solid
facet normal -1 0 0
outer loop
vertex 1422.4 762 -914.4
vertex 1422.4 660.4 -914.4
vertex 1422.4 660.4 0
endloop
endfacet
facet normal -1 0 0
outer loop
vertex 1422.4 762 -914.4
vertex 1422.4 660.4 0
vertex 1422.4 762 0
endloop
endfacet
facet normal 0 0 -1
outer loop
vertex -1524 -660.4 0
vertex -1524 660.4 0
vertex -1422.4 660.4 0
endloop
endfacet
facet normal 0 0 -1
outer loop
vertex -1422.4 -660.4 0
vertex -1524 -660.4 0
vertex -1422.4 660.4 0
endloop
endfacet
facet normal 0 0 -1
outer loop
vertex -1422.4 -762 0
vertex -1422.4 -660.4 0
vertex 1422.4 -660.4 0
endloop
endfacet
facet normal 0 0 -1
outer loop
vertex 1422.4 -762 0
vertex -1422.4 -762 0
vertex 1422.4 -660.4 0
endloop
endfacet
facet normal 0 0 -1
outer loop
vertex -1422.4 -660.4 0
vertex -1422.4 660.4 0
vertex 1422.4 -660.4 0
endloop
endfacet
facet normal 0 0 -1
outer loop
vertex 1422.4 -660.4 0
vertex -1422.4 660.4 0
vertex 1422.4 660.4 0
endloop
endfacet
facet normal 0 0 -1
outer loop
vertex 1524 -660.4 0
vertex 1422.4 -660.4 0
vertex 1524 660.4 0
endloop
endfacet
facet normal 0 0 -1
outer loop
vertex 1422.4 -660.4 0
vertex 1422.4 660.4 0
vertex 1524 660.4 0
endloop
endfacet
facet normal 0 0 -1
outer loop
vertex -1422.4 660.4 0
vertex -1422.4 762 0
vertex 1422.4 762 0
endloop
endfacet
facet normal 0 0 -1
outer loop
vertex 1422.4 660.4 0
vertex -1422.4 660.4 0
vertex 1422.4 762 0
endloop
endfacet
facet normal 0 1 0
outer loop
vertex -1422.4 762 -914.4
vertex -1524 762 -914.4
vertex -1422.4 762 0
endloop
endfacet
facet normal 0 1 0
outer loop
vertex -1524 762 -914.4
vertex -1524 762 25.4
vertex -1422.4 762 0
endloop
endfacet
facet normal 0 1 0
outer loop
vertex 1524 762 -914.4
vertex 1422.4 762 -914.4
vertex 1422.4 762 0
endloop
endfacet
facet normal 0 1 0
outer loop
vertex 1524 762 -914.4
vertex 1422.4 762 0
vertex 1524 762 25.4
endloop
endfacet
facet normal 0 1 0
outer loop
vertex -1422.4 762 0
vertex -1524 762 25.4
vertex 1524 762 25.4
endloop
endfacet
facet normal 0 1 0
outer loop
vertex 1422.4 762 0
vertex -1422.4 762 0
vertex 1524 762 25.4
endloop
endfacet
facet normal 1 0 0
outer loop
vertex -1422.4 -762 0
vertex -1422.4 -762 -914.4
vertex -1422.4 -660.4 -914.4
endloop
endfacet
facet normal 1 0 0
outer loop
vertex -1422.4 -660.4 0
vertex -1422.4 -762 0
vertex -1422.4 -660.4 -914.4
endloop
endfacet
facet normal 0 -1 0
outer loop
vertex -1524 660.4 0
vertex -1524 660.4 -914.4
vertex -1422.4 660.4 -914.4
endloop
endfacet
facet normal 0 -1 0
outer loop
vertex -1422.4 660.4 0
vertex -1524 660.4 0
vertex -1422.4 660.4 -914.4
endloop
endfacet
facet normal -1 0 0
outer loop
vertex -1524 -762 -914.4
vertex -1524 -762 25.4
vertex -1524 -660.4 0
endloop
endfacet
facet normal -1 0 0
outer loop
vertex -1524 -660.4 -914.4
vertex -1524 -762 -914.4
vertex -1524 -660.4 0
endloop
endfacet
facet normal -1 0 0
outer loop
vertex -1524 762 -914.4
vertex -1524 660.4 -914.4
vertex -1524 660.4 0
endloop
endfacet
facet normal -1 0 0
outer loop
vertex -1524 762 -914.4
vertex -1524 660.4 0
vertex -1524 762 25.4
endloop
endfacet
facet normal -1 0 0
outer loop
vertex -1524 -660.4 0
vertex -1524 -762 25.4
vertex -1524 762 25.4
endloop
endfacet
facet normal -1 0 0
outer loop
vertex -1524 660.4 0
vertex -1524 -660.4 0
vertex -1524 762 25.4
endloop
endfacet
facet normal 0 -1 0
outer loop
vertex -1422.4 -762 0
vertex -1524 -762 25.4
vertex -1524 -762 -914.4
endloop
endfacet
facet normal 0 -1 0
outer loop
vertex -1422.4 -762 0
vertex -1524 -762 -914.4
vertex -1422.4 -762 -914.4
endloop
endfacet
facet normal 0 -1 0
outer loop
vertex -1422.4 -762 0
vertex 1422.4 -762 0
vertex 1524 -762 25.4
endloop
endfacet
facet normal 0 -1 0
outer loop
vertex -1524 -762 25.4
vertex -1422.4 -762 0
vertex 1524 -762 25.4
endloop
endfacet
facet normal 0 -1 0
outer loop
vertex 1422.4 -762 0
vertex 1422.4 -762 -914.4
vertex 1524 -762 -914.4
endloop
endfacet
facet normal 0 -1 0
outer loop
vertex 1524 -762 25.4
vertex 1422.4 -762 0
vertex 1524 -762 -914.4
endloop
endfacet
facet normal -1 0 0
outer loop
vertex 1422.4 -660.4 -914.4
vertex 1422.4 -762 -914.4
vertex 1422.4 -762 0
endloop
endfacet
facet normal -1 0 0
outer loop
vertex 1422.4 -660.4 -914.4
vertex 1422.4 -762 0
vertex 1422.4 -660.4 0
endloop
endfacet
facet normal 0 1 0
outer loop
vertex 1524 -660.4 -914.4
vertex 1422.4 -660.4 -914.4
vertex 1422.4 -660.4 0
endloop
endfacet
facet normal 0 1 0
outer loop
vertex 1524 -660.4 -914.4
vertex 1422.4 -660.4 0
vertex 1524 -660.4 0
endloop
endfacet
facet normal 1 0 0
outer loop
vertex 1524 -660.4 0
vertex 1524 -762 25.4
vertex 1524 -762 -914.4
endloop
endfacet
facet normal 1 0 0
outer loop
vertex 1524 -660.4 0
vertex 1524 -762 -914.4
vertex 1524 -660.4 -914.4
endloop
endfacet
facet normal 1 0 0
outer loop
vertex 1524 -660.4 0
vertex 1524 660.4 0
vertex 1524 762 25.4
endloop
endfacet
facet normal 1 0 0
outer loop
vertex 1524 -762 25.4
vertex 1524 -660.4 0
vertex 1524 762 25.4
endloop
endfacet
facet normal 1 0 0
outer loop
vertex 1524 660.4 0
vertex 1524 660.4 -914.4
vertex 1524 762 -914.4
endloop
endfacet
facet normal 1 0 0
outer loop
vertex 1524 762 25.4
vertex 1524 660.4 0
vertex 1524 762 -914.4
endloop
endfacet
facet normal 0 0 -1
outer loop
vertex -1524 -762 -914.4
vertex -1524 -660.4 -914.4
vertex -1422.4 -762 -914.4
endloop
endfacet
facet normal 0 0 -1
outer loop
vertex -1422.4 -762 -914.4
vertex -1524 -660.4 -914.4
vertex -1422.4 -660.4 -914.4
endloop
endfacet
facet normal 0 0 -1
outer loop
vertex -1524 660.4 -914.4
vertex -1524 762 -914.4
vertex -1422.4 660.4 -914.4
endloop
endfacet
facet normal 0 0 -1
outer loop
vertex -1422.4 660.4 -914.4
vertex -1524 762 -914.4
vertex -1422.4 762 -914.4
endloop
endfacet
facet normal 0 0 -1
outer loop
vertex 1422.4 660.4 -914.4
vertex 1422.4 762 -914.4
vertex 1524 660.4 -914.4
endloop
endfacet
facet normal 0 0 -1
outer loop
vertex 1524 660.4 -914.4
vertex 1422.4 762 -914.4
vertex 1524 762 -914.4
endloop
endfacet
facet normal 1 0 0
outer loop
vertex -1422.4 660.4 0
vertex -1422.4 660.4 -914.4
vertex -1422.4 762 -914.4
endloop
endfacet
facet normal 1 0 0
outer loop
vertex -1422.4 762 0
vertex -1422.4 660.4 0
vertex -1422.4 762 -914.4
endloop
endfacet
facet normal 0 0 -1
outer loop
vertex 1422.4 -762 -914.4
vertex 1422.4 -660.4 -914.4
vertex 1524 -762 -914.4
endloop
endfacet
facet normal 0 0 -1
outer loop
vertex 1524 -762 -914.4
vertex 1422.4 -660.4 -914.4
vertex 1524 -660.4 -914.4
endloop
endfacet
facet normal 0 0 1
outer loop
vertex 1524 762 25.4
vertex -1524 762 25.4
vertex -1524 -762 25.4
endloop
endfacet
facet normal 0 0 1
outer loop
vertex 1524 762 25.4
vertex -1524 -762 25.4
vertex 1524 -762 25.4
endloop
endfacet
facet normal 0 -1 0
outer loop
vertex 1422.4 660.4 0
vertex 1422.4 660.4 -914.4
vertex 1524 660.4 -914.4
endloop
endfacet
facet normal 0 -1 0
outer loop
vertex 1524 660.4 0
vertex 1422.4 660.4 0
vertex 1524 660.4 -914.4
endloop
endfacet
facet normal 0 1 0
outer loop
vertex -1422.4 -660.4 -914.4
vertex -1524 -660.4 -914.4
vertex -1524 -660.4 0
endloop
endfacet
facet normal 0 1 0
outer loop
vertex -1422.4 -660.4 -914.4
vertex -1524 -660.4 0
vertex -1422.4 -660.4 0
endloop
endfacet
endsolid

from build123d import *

# Parameters (mm, degrees)
F0_W     = 3048
F0_H     = 1524
F1_DEPTH = 25.4
F2_W     = 101.6
F2_H     = 101.6
F3_DEPTH = 914.4


with BuildPart() as f1:
    # F0 (on Top) → F1 (new body)
    with BuildSketch(Plane.XY):
        Rectangle(F0_W, F0_H)
    extrude(amount=F1_DEPTH)

    # F2 (on Top) → F3 (join)
    with BuildSketch(Plane.XY):
        with Locations((-1473.2, 711.2)):
            Rectangle(F2_W, F2_H)
        with Locations((-1473.2, -711.2)):
            Rectangle(F2_W, F2_H)
        with Locations((1473.2, 711.2)):
            Rectangle(F2_W, F2_H)
        with Locations((1473.2, -711.2)):
            Rectangle(F2_W, F2_H)
    extrude(amount=-F3_DEPTH)


solid = f1.part
